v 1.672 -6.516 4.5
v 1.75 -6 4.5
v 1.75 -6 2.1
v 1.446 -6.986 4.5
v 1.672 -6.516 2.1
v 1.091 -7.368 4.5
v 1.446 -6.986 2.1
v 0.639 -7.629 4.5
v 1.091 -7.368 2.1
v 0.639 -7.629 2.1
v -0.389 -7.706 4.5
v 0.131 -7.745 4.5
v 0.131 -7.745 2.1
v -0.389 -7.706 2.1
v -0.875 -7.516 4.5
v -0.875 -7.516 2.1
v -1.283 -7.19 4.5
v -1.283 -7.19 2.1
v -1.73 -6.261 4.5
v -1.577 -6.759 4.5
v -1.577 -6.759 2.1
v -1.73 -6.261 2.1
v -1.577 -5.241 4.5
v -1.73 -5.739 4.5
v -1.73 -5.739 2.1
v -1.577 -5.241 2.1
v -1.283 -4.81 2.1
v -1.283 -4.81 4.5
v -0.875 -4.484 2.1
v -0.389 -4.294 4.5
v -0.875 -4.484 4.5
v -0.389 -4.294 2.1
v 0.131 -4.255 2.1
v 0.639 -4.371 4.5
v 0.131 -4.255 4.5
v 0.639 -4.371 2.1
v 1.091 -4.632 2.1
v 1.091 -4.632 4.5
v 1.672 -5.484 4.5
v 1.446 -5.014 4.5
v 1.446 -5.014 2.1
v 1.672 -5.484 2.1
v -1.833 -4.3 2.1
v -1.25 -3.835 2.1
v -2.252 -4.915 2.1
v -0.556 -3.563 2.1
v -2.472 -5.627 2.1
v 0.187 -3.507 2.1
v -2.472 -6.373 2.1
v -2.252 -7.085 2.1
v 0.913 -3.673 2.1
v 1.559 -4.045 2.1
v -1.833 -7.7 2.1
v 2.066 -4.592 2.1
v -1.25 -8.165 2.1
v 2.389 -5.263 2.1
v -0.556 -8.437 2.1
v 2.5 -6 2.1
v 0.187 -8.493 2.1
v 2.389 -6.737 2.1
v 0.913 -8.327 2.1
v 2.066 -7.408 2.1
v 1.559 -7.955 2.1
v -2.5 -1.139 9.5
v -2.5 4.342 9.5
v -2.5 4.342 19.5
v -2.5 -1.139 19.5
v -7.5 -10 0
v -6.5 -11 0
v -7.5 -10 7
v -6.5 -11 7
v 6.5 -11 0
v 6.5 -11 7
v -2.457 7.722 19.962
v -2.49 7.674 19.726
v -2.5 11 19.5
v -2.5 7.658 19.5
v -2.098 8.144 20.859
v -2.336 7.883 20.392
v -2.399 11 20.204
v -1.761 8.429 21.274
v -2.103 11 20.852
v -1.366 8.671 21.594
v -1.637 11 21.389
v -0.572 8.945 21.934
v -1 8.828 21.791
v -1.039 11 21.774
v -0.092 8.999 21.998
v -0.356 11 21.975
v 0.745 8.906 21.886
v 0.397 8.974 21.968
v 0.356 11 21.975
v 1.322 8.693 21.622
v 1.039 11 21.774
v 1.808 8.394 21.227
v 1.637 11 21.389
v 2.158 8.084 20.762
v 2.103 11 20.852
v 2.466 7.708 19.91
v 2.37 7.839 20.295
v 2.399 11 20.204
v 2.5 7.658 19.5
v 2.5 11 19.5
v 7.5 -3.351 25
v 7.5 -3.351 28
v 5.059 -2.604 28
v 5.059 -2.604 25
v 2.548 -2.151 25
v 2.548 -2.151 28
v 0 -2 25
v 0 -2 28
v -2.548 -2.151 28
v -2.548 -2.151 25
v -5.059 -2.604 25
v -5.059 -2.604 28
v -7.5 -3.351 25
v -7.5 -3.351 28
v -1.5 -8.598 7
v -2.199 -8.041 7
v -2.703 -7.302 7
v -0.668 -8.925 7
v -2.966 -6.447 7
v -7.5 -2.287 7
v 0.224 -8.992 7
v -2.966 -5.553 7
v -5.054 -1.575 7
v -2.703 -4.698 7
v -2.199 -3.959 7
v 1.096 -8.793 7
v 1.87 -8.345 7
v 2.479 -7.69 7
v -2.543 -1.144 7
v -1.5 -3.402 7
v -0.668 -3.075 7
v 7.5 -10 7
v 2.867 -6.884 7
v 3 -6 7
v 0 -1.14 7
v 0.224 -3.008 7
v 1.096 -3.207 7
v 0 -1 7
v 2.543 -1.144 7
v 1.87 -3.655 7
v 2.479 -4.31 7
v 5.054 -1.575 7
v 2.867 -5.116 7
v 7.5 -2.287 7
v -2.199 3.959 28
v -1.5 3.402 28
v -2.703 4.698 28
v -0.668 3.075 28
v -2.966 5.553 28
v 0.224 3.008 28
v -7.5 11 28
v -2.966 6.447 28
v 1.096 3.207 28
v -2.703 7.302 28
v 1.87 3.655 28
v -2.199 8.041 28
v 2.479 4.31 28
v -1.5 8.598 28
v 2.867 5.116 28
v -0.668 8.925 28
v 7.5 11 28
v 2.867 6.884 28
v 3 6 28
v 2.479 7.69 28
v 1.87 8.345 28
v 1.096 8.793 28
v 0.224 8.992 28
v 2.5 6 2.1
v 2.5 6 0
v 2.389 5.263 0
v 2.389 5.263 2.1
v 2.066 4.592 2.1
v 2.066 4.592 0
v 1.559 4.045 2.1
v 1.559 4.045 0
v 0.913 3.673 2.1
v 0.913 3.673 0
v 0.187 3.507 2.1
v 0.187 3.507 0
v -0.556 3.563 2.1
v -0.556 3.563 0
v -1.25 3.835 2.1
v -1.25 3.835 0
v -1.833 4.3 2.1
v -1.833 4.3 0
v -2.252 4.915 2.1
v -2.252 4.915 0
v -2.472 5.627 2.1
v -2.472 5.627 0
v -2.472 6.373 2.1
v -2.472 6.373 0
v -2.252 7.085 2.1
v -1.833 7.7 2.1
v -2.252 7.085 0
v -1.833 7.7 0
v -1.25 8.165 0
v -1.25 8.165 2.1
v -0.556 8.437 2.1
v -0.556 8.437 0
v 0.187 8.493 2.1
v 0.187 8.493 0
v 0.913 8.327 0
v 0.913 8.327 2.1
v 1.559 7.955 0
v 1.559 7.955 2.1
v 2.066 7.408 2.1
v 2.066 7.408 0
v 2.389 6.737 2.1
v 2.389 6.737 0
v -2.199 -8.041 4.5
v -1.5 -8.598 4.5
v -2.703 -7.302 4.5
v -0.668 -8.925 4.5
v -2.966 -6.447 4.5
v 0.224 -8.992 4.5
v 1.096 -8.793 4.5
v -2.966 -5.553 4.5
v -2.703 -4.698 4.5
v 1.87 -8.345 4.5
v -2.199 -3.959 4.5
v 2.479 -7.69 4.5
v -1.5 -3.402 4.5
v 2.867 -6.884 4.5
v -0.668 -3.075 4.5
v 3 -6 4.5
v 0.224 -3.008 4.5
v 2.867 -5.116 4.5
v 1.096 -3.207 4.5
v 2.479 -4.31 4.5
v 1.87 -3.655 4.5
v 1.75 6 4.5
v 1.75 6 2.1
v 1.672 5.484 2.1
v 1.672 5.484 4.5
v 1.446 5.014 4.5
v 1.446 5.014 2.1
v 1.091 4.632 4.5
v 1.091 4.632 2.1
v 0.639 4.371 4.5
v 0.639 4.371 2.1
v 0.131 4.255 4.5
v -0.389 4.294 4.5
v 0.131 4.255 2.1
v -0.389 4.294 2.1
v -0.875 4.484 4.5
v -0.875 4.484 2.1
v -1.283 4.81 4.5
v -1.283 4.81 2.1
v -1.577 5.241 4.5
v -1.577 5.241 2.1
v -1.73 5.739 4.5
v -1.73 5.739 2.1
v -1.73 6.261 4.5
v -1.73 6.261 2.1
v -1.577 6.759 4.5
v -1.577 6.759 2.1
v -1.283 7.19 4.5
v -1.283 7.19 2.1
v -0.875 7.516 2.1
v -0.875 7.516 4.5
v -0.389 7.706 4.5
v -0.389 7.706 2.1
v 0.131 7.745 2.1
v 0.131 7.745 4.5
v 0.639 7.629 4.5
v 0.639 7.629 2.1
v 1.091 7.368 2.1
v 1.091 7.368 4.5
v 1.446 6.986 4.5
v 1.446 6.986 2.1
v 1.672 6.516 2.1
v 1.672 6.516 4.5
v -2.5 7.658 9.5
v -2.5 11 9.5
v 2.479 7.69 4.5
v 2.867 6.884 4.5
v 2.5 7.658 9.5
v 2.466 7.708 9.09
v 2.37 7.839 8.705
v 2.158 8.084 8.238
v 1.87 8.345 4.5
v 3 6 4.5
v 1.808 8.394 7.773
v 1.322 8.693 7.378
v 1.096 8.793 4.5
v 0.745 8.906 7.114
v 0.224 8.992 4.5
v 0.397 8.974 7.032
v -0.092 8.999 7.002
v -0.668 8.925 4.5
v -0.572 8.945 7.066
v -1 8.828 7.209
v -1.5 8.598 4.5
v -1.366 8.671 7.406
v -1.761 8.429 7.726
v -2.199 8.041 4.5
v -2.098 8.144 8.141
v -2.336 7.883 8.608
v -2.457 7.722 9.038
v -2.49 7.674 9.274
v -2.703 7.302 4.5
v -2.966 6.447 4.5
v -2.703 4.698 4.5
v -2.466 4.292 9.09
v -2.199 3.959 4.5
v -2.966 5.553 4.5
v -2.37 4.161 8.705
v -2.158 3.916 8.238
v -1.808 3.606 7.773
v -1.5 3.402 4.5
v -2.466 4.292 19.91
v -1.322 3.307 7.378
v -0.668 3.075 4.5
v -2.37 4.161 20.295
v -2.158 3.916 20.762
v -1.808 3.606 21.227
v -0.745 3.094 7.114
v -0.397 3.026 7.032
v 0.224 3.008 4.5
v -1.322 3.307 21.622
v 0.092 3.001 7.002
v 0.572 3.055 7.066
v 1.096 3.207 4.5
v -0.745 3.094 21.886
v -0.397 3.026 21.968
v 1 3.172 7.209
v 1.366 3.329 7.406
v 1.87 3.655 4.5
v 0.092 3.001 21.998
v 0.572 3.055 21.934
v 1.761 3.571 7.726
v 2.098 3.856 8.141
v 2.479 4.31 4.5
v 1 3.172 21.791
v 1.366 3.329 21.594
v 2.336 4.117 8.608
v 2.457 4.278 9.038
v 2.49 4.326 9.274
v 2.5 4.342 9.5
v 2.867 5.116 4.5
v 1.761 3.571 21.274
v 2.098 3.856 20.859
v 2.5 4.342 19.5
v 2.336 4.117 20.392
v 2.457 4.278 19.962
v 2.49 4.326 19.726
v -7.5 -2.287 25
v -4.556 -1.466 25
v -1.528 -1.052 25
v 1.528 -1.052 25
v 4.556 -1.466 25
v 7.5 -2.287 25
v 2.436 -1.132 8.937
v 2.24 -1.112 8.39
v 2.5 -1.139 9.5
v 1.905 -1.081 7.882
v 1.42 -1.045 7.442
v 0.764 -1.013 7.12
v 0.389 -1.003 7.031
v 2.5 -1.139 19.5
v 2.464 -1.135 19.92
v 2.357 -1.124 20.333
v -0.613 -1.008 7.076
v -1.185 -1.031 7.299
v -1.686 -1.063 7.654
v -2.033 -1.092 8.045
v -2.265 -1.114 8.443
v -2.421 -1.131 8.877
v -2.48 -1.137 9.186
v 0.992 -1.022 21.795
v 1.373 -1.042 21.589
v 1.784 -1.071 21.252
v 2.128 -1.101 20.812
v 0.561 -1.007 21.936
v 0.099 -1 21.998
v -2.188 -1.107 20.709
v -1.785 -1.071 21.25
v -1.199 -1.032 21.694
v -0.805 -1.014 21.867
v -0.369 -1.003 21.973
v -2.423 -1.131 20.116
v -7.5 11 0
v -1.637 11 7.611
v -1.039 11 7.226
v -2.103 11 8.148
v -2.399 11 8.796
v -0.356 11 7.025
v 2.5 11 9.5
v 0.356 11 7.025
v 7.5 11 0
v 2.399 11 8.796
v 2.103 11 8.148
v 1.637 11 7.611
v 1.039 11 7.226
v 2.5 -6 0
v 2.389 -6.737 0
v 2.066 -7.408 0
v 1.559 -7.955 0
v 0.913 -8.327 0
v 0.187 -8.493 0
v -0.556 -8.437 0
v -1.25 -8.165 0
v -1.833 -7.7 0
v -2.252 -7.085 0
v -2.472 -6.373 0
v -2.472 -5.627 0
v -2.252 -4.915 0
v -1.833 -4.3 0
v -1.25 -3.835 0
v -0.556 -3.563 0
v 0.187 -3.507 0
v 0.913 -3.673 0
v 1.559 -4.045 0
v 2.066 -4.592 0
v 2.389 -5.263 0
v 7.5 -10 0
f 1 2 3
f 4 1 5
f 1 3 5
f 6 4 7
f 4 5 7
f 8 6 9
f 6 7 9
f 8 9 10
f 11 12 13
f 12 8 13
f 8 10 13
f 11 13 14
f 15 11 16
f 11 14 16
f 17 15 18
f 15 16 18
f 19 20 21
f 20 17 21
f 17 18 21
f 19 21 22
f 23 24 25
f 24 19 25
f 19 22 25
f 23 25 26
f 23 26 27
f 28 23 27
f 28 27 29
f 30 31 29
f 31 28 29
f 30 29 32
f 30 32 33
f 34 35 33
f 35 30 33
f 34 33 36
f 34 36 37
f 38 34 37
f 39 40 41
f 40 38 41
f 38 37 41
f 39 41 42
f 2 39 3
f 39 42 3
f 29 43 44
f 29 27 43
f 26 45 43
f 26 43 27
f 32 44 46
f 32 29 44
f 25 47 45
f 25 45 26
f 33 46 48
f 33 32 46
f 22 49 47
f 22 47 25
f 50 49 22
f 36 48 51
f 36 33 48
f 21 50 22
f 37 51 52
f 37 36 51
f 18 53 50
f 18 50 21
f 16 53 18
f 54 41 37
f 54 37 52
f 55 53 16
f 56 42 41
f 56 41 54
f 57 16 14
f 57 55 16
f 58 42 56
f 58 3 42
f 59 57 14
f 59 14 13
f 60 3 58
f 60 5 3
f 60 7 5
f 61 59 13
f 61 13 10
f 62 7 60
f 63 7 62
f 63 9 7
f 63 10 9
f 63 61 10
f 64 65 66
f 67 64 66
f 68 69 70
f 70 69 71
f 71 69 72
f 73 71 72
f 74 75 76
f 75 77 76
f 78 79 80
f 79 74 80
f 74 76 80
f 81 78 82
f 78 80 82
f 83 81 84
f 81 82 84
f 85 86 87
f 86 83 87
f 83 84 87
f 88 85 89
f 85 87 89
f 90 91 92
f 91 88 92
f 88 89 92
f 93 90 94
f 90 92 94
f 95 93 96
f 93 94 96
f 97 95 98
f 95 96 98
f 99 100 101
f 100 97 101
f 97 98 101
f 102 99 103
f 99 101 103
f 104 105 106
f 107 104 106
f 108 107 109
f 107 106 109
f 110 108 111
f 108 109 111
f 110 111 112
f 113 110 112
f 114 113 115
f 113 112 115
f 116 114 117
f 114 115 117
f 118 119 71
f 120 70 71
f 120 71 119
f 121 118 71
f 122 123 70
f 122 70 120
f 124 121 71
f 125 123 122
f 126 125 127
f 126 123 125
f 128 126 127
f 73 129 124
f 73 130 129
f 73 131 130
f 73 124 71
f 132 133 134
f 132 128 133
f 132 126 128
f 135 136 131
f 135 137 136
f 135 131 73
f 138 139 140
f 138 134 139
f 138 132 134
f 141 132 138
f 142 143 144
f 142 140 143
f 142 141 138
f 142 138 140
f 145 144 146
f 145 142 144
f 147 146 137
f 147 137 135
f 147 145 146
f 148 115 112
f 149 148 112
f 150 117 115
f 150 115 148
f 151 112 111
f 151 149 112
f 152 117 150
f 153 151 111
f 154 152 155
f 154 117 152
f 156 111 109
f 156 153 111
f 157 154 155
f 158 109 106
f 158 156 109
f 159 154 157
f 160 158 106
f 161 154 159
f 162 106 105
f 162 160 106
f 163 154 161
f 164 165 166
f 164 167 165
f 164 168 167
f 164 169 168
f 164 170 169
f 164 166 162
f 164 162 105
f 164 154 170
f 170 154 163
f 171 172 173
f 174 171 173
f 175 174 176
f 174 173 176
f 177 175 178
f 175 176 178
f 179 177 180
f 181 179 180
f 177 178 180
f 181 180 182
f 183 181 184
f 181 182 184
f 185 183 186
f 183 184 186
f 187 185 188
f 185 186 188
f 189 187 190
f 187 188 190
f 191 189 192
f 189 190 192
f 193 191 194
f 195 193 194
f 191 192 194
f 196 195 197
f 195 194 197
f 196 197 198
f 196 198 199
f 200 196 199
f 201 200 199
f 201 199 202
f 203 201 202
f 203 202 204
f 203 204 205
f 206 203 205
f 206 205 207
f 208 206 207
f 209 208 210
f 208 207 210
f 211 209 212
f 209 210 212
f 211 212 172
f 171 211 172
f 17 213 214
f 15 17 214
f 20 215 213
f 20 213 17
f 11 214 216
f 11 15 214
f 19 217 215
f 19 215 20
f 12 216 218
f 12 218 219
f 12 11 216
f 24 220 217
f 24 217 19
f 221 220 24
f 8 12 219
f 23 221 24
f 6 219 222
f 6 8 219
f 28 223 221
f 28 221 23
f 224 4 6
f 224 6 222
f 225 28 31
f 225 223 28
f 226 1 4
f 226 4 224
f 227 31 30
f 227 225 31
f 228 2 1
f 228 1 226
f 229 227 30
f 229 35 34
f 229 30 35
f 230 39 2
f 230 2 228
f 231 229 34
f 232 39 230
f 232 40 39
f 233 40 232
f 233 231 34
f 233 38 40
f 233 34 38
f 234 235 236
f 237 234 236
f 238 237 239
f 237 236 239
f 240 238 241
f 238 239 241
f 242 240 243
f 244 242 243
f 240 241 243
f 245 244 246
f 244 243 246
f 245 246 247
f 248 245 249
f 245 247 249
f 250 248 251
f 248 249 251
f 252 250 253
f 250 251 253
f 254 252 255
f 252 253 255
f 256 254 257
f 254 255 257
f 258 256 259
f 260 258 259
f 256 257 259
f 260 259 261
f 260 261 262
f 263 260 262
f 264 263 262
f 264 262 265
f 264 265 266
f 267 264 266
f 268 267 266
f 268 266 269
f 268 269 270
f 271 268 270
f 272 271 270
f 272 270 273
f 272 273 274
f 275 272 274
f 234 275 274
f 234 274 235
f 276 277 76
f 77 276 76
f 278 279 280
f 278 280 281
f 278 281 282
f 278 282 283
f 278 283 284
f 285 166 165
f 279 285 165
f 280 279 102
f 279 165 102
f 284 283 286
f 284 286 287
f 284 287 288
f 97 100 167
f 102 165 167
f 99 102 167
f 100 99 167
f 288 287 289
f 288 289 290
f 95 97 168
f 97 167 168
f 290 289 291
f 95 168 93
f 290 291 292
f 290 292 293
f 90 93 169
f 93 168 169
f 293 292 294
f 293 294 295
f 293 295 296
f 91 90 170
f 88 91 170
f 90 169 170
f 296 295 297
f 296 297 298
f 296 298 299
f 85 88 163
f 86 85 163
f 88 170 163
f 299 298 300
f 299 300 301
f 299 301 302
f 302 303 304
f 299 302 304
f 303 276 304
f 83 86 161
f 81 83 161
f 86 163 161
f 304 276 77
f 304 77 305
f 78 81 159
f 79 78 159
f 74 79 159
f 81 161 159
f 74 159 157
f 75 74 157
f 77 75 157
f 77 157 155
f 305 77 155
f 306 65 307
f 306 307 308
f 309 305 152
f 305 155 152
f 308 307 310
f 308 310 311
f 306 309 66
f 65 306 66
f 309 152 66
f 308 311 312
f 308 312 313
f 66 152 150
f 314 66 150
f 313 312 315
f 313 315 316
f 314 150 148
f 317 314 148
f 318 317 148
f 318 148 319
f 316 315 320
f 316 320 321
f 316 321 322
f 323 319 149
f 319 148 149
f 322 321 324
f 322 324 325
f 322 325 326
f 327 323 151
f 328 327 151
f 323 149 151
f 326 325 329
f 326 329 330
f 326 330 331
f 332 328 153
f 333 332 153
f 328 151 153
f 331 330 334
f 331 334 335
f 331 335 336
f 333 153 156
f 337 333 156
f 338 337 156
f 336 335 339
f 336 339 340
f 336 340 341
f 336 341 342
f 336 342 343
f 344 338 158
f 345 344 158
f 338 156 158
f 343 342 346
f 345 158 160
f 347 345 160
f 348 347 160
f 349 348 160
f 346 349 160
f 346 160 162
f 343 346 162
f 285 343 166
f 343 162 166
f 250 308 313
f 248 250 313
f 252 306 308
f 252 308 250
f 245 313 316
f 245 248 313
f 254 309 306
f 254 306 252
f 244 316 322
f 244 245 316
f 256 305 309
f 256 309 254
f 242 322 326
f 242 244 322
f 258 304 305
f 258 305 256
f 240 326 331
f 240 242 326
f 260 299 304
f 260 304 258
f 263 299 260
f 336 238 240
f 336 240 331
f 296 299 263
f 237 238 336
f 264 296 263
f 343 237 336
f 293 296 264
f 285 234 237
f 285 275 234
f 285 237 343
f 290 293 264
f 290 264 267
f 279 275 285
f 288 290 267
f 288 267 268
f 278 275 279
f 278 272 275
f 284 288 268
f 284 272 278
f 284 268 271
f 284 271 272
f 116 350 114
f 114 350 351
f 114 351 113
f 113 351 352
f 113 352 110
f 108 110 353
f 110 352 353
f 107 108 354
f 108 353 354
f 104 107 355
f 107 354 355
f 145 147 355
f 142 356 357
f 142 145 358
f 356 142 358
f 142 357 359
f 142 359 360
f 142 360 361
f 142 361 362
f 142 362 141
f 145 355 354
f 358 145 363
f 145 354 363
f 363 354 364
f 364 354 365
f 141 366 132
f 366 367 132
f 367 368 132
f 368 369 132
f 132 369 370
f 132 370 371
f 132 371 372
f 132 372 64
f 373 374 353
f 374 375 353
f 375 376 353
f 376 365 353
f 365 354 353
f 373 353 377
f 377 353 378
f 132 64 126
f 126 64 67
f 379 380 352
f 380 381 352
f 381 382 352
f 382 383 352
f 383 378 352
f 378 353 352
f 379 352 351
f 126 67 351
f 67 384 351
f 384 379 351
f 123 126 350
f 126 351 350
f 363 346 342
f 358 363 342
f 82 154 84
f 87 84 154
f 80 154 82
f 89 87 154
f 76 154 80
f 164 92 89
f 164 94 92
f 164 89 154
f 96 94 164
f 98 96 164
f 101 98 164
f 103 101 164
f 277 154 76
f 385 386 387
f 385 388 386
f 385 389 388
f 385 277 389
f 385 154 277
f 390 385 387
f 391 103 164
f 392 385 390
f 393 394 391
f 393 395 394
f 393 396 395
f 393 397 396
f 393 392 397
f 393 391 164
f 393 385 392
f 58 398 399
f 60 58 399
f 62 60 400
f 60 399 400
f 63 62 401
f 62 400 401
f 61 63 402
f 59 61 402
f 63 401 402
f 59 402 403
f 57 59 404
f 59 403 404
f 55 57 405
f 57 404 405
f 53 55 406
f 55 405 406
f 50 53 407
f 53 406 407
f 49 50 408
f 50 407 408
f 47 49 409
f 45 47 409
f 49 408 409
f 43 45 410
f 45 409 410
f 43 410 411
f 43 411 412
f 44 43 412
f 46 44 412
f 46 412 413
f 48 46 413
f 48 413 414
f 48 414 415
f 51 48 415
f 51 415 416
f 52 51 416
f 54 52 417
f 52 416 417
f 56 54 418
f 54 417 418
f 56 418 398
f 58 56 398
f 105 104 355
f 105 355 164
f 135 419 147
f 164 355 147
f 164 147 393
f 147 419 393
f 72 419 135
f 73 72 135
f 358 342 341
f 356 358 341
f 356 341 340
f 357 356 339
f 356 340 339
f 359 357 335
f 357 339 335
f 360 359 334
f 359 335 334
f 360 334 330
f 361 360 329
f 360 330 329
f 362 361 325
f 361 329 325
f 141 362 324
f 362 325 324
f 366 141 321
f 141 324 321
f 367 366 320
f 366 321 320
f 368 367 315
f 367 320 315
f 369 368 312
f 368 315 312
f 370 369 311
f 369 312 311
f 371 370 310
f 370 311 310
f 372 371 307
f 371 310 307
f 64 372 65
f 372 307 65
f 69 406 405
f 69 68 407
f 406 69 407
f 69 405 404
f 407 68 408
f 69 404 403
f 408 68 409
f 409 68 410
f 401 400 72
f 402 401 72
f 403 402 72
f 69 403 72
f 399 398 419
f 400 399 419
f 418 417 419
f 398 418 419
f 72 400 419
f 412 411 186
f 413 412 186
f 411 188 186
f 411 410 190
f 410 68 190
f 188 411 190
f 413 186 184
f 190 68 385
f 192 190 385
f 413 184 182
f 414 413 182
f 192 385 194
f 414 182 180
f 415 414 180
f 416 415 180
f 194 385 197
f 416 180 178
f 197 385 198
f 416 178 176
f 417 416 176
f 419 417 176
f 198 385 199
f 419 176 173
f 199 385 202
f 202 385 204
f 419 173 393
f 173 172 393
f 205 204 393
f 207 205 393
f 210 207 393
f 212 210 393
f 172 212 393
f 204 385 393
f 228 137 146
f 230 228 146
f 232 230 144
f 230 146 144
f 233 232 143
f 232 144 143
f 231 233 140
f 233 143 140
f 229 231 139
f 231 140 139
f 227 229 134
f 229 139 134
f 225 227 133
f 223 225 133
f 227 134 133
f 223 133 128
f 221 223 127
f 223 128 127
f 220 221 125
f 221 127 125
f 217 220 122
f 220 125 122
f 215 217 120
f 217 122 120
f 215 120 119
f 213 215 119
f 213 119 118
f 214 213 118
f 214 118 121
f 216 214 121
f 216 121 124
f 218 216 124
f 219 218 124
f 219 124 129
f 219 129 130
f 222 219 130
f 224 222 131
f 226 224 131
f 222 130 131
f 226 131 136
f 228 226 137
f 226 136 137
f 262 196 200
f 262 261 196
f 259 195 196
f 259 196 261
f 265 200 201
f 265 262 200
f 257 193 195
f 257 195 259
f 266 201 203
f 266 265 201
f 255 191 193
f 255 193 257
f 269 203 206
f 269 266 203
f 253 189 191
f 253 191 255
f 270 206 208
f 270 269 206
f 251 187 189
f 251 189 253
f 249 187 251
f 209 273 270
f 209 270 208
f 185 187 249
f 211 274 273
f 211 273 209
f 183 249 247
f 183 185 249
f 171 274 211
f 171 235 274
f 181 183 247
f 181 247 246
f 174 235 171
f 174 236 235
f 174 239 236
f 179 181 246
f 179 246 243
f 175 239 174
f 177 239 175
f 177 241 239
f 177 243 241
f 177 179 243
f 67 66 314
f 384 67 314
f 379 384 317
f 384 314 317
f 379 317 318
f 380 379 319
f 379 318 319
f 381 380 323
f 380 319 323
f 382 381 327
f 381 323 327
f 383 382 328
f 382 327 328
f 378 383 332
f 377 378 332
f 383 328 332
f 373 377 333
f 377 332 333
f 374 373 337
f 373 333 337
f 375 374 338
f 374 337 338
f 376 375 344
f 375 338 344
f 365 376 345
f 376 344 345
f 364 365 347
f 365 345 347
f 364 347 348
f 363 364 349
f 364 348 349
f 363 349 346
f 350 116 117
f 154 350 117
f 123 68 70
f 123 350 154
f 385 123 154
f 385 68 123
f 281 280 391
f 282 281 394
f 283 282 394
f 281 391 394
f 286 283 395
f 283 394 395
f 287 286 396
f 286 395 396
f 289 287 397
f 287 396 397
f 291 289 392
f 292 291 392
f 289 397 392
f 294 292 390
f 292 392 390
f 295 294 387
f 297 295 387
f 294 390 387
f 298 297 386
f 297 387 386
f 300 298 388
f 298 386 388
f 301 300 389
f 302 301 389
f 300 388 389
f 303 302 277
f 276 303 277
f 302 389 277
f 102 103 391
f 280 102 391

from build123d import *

# Parameters (mm, degrees)
F0_W      = 15
F0_H      = 22
F1_DEPTH  = 28
F3_DEPTH  = 3
F4_R      = 22.5
F5_DEPTH  = 18
F7_DEPTH  = 12.140320325
F8_R      = 2.5
F8_R_2    = 1.75
F9_DEPTH  = 2.1
F10_DEPTH = 7.7156429929
F11_R     = 3
F11_R_2   = 1.75
F12_DEPTH = 2.5
F13_R     = 3
F14_DEPTH = 23.5
F15_SIZE  = 1


with BuildPart() as f1:
    # F0 (on Top) → F1 (new body)
    with BuildSketch(Plane.XY):
        Rectangle(F0_W, F0_H)
    extrude(amount=F1_DEPTH)

    # F2 (on face) → F3 (cut)
    with BuildSketch(Plane.XY.offset(28)):
        with BuildLine():
            Line((-7.5, -11), (-7.5, -3.3505583204))
            ThreePointArc((-7.5, -3.3505583204), (-12.2678441464, -41.156443583), (21.5, -23.5))
            ThreePointArc((21.5, -23.5), (17.656443583, -11.2321558536), (7.5, -3.3505583204))
            Line((7.5, -3.3505583204), (7.5, -11))
            Line((7.5, -11), (-7.5, -11))
        make_face()
        with BuildLine():
            ThreePointArc((7.5, -3.3505583204), (3.8103152027, -2.3403332244), (0, -2))
            ThreePointArc((0, -2), (-3.8103152027, -2.3403332244), (-7.5, -3.3505583204))
            Line((-7.5, -3.3505583204), (-7.5, -11))
            Line((-7.5, -11), (7.5, -11))
            Line((7.5, -11), (7.5, -3.3505583204))
        make_face()
    extrude(amount=-F3_DEPTH, mode=Mode.SUBTRACT)

    # F4 (on face) → F5 (cut)
    with BuildSketch(Plane.XY.offset(25)):
        with Locations((0, -23.5)):
            Circle(F4_R)
    extrude(amount=-F5_DEPTH, mode=Mode.SUBTRACT)

    # F6 (on face) → F7 (cut, through all)
    with BuildSketch(Plane(origin=(0, 11, 0), x_dir=(-1, 0, 0), z_dir=(0, 1, 0))):
        with BuildLine():
            Line((-2.5, 19.5), (-2.5, 9.5))
            ThreePointArc((-2.5, 9.5), (0, 7), (2.5, 9.5))
            Line((2.5, 9.5), (2.5, 19.5))
            ThreePointArc((2.5, 19.5), (0, 22), (-2.5, 19.5))
        make_face()
    extrude(amount=-F7_DEPTH, mode=Mode.SUBTRACT)

    # F8 (on face) → F9 (cut)
    with BuildSketch(Plane(origin=(0, 0, 0), x_dir=(1, 0, 0), z_dir=(0, 0, -1))):
        with Locations((0, 6)):
            Circle(F8_R)
        with Locations((0, 6)):
            Circle(F8_R_2, mode=Mode.SUBTRACT)
        with Locations((0, -6)):
            Circle(F8_R)
        with Locations((0, -6)):
            Circle(F8_R_2, mode=Mode.SUBTRACT)
    extrude(amount=-F9_DEPTH, mode=Mode.SUBTRACT)

    # F10 (cut, through all): faces of the model
    f10_faces = [f1.faces().sort_by_distance(p)[0] for p in [
        (0, 6, 0),
        (0, -6, 0),
    ]]
    extrude(f10_faces, amount=-F10_DEPTH, mode=Mode.SUBTRACT)

    # F11 (on face) → F12 (cut)
    with BuildSketch(Plane.XY.offset(7)):
        with Locations((0, -6)):
            Circle(F11_R)
        with Locations((0, -6)):
            Circle(F11_R_2, mode=Mode.SUBTRACT)
    extrude(amount=-F12_DEPTH, mode=Mode.SUBTRACT)

    # F13 (on face) → F14 (cut)
    with BuildSketch(Plane.XY.offset(28)):
        with Locations((0, 6)):
            Circle(F13_R)
    extrude(amount=-F14_DEPTH, mode=Mode.SUBTRACT)

    # F15
    f15_edges = [f1.edges().sort_by_distance(p)[0] for p in [
        (7.5, -11, 3.5),
        (-7.5, -11, 3.5),
    ]]
    chamfer(f15_edges, length=F15_SIZE)


solid = f1.part
